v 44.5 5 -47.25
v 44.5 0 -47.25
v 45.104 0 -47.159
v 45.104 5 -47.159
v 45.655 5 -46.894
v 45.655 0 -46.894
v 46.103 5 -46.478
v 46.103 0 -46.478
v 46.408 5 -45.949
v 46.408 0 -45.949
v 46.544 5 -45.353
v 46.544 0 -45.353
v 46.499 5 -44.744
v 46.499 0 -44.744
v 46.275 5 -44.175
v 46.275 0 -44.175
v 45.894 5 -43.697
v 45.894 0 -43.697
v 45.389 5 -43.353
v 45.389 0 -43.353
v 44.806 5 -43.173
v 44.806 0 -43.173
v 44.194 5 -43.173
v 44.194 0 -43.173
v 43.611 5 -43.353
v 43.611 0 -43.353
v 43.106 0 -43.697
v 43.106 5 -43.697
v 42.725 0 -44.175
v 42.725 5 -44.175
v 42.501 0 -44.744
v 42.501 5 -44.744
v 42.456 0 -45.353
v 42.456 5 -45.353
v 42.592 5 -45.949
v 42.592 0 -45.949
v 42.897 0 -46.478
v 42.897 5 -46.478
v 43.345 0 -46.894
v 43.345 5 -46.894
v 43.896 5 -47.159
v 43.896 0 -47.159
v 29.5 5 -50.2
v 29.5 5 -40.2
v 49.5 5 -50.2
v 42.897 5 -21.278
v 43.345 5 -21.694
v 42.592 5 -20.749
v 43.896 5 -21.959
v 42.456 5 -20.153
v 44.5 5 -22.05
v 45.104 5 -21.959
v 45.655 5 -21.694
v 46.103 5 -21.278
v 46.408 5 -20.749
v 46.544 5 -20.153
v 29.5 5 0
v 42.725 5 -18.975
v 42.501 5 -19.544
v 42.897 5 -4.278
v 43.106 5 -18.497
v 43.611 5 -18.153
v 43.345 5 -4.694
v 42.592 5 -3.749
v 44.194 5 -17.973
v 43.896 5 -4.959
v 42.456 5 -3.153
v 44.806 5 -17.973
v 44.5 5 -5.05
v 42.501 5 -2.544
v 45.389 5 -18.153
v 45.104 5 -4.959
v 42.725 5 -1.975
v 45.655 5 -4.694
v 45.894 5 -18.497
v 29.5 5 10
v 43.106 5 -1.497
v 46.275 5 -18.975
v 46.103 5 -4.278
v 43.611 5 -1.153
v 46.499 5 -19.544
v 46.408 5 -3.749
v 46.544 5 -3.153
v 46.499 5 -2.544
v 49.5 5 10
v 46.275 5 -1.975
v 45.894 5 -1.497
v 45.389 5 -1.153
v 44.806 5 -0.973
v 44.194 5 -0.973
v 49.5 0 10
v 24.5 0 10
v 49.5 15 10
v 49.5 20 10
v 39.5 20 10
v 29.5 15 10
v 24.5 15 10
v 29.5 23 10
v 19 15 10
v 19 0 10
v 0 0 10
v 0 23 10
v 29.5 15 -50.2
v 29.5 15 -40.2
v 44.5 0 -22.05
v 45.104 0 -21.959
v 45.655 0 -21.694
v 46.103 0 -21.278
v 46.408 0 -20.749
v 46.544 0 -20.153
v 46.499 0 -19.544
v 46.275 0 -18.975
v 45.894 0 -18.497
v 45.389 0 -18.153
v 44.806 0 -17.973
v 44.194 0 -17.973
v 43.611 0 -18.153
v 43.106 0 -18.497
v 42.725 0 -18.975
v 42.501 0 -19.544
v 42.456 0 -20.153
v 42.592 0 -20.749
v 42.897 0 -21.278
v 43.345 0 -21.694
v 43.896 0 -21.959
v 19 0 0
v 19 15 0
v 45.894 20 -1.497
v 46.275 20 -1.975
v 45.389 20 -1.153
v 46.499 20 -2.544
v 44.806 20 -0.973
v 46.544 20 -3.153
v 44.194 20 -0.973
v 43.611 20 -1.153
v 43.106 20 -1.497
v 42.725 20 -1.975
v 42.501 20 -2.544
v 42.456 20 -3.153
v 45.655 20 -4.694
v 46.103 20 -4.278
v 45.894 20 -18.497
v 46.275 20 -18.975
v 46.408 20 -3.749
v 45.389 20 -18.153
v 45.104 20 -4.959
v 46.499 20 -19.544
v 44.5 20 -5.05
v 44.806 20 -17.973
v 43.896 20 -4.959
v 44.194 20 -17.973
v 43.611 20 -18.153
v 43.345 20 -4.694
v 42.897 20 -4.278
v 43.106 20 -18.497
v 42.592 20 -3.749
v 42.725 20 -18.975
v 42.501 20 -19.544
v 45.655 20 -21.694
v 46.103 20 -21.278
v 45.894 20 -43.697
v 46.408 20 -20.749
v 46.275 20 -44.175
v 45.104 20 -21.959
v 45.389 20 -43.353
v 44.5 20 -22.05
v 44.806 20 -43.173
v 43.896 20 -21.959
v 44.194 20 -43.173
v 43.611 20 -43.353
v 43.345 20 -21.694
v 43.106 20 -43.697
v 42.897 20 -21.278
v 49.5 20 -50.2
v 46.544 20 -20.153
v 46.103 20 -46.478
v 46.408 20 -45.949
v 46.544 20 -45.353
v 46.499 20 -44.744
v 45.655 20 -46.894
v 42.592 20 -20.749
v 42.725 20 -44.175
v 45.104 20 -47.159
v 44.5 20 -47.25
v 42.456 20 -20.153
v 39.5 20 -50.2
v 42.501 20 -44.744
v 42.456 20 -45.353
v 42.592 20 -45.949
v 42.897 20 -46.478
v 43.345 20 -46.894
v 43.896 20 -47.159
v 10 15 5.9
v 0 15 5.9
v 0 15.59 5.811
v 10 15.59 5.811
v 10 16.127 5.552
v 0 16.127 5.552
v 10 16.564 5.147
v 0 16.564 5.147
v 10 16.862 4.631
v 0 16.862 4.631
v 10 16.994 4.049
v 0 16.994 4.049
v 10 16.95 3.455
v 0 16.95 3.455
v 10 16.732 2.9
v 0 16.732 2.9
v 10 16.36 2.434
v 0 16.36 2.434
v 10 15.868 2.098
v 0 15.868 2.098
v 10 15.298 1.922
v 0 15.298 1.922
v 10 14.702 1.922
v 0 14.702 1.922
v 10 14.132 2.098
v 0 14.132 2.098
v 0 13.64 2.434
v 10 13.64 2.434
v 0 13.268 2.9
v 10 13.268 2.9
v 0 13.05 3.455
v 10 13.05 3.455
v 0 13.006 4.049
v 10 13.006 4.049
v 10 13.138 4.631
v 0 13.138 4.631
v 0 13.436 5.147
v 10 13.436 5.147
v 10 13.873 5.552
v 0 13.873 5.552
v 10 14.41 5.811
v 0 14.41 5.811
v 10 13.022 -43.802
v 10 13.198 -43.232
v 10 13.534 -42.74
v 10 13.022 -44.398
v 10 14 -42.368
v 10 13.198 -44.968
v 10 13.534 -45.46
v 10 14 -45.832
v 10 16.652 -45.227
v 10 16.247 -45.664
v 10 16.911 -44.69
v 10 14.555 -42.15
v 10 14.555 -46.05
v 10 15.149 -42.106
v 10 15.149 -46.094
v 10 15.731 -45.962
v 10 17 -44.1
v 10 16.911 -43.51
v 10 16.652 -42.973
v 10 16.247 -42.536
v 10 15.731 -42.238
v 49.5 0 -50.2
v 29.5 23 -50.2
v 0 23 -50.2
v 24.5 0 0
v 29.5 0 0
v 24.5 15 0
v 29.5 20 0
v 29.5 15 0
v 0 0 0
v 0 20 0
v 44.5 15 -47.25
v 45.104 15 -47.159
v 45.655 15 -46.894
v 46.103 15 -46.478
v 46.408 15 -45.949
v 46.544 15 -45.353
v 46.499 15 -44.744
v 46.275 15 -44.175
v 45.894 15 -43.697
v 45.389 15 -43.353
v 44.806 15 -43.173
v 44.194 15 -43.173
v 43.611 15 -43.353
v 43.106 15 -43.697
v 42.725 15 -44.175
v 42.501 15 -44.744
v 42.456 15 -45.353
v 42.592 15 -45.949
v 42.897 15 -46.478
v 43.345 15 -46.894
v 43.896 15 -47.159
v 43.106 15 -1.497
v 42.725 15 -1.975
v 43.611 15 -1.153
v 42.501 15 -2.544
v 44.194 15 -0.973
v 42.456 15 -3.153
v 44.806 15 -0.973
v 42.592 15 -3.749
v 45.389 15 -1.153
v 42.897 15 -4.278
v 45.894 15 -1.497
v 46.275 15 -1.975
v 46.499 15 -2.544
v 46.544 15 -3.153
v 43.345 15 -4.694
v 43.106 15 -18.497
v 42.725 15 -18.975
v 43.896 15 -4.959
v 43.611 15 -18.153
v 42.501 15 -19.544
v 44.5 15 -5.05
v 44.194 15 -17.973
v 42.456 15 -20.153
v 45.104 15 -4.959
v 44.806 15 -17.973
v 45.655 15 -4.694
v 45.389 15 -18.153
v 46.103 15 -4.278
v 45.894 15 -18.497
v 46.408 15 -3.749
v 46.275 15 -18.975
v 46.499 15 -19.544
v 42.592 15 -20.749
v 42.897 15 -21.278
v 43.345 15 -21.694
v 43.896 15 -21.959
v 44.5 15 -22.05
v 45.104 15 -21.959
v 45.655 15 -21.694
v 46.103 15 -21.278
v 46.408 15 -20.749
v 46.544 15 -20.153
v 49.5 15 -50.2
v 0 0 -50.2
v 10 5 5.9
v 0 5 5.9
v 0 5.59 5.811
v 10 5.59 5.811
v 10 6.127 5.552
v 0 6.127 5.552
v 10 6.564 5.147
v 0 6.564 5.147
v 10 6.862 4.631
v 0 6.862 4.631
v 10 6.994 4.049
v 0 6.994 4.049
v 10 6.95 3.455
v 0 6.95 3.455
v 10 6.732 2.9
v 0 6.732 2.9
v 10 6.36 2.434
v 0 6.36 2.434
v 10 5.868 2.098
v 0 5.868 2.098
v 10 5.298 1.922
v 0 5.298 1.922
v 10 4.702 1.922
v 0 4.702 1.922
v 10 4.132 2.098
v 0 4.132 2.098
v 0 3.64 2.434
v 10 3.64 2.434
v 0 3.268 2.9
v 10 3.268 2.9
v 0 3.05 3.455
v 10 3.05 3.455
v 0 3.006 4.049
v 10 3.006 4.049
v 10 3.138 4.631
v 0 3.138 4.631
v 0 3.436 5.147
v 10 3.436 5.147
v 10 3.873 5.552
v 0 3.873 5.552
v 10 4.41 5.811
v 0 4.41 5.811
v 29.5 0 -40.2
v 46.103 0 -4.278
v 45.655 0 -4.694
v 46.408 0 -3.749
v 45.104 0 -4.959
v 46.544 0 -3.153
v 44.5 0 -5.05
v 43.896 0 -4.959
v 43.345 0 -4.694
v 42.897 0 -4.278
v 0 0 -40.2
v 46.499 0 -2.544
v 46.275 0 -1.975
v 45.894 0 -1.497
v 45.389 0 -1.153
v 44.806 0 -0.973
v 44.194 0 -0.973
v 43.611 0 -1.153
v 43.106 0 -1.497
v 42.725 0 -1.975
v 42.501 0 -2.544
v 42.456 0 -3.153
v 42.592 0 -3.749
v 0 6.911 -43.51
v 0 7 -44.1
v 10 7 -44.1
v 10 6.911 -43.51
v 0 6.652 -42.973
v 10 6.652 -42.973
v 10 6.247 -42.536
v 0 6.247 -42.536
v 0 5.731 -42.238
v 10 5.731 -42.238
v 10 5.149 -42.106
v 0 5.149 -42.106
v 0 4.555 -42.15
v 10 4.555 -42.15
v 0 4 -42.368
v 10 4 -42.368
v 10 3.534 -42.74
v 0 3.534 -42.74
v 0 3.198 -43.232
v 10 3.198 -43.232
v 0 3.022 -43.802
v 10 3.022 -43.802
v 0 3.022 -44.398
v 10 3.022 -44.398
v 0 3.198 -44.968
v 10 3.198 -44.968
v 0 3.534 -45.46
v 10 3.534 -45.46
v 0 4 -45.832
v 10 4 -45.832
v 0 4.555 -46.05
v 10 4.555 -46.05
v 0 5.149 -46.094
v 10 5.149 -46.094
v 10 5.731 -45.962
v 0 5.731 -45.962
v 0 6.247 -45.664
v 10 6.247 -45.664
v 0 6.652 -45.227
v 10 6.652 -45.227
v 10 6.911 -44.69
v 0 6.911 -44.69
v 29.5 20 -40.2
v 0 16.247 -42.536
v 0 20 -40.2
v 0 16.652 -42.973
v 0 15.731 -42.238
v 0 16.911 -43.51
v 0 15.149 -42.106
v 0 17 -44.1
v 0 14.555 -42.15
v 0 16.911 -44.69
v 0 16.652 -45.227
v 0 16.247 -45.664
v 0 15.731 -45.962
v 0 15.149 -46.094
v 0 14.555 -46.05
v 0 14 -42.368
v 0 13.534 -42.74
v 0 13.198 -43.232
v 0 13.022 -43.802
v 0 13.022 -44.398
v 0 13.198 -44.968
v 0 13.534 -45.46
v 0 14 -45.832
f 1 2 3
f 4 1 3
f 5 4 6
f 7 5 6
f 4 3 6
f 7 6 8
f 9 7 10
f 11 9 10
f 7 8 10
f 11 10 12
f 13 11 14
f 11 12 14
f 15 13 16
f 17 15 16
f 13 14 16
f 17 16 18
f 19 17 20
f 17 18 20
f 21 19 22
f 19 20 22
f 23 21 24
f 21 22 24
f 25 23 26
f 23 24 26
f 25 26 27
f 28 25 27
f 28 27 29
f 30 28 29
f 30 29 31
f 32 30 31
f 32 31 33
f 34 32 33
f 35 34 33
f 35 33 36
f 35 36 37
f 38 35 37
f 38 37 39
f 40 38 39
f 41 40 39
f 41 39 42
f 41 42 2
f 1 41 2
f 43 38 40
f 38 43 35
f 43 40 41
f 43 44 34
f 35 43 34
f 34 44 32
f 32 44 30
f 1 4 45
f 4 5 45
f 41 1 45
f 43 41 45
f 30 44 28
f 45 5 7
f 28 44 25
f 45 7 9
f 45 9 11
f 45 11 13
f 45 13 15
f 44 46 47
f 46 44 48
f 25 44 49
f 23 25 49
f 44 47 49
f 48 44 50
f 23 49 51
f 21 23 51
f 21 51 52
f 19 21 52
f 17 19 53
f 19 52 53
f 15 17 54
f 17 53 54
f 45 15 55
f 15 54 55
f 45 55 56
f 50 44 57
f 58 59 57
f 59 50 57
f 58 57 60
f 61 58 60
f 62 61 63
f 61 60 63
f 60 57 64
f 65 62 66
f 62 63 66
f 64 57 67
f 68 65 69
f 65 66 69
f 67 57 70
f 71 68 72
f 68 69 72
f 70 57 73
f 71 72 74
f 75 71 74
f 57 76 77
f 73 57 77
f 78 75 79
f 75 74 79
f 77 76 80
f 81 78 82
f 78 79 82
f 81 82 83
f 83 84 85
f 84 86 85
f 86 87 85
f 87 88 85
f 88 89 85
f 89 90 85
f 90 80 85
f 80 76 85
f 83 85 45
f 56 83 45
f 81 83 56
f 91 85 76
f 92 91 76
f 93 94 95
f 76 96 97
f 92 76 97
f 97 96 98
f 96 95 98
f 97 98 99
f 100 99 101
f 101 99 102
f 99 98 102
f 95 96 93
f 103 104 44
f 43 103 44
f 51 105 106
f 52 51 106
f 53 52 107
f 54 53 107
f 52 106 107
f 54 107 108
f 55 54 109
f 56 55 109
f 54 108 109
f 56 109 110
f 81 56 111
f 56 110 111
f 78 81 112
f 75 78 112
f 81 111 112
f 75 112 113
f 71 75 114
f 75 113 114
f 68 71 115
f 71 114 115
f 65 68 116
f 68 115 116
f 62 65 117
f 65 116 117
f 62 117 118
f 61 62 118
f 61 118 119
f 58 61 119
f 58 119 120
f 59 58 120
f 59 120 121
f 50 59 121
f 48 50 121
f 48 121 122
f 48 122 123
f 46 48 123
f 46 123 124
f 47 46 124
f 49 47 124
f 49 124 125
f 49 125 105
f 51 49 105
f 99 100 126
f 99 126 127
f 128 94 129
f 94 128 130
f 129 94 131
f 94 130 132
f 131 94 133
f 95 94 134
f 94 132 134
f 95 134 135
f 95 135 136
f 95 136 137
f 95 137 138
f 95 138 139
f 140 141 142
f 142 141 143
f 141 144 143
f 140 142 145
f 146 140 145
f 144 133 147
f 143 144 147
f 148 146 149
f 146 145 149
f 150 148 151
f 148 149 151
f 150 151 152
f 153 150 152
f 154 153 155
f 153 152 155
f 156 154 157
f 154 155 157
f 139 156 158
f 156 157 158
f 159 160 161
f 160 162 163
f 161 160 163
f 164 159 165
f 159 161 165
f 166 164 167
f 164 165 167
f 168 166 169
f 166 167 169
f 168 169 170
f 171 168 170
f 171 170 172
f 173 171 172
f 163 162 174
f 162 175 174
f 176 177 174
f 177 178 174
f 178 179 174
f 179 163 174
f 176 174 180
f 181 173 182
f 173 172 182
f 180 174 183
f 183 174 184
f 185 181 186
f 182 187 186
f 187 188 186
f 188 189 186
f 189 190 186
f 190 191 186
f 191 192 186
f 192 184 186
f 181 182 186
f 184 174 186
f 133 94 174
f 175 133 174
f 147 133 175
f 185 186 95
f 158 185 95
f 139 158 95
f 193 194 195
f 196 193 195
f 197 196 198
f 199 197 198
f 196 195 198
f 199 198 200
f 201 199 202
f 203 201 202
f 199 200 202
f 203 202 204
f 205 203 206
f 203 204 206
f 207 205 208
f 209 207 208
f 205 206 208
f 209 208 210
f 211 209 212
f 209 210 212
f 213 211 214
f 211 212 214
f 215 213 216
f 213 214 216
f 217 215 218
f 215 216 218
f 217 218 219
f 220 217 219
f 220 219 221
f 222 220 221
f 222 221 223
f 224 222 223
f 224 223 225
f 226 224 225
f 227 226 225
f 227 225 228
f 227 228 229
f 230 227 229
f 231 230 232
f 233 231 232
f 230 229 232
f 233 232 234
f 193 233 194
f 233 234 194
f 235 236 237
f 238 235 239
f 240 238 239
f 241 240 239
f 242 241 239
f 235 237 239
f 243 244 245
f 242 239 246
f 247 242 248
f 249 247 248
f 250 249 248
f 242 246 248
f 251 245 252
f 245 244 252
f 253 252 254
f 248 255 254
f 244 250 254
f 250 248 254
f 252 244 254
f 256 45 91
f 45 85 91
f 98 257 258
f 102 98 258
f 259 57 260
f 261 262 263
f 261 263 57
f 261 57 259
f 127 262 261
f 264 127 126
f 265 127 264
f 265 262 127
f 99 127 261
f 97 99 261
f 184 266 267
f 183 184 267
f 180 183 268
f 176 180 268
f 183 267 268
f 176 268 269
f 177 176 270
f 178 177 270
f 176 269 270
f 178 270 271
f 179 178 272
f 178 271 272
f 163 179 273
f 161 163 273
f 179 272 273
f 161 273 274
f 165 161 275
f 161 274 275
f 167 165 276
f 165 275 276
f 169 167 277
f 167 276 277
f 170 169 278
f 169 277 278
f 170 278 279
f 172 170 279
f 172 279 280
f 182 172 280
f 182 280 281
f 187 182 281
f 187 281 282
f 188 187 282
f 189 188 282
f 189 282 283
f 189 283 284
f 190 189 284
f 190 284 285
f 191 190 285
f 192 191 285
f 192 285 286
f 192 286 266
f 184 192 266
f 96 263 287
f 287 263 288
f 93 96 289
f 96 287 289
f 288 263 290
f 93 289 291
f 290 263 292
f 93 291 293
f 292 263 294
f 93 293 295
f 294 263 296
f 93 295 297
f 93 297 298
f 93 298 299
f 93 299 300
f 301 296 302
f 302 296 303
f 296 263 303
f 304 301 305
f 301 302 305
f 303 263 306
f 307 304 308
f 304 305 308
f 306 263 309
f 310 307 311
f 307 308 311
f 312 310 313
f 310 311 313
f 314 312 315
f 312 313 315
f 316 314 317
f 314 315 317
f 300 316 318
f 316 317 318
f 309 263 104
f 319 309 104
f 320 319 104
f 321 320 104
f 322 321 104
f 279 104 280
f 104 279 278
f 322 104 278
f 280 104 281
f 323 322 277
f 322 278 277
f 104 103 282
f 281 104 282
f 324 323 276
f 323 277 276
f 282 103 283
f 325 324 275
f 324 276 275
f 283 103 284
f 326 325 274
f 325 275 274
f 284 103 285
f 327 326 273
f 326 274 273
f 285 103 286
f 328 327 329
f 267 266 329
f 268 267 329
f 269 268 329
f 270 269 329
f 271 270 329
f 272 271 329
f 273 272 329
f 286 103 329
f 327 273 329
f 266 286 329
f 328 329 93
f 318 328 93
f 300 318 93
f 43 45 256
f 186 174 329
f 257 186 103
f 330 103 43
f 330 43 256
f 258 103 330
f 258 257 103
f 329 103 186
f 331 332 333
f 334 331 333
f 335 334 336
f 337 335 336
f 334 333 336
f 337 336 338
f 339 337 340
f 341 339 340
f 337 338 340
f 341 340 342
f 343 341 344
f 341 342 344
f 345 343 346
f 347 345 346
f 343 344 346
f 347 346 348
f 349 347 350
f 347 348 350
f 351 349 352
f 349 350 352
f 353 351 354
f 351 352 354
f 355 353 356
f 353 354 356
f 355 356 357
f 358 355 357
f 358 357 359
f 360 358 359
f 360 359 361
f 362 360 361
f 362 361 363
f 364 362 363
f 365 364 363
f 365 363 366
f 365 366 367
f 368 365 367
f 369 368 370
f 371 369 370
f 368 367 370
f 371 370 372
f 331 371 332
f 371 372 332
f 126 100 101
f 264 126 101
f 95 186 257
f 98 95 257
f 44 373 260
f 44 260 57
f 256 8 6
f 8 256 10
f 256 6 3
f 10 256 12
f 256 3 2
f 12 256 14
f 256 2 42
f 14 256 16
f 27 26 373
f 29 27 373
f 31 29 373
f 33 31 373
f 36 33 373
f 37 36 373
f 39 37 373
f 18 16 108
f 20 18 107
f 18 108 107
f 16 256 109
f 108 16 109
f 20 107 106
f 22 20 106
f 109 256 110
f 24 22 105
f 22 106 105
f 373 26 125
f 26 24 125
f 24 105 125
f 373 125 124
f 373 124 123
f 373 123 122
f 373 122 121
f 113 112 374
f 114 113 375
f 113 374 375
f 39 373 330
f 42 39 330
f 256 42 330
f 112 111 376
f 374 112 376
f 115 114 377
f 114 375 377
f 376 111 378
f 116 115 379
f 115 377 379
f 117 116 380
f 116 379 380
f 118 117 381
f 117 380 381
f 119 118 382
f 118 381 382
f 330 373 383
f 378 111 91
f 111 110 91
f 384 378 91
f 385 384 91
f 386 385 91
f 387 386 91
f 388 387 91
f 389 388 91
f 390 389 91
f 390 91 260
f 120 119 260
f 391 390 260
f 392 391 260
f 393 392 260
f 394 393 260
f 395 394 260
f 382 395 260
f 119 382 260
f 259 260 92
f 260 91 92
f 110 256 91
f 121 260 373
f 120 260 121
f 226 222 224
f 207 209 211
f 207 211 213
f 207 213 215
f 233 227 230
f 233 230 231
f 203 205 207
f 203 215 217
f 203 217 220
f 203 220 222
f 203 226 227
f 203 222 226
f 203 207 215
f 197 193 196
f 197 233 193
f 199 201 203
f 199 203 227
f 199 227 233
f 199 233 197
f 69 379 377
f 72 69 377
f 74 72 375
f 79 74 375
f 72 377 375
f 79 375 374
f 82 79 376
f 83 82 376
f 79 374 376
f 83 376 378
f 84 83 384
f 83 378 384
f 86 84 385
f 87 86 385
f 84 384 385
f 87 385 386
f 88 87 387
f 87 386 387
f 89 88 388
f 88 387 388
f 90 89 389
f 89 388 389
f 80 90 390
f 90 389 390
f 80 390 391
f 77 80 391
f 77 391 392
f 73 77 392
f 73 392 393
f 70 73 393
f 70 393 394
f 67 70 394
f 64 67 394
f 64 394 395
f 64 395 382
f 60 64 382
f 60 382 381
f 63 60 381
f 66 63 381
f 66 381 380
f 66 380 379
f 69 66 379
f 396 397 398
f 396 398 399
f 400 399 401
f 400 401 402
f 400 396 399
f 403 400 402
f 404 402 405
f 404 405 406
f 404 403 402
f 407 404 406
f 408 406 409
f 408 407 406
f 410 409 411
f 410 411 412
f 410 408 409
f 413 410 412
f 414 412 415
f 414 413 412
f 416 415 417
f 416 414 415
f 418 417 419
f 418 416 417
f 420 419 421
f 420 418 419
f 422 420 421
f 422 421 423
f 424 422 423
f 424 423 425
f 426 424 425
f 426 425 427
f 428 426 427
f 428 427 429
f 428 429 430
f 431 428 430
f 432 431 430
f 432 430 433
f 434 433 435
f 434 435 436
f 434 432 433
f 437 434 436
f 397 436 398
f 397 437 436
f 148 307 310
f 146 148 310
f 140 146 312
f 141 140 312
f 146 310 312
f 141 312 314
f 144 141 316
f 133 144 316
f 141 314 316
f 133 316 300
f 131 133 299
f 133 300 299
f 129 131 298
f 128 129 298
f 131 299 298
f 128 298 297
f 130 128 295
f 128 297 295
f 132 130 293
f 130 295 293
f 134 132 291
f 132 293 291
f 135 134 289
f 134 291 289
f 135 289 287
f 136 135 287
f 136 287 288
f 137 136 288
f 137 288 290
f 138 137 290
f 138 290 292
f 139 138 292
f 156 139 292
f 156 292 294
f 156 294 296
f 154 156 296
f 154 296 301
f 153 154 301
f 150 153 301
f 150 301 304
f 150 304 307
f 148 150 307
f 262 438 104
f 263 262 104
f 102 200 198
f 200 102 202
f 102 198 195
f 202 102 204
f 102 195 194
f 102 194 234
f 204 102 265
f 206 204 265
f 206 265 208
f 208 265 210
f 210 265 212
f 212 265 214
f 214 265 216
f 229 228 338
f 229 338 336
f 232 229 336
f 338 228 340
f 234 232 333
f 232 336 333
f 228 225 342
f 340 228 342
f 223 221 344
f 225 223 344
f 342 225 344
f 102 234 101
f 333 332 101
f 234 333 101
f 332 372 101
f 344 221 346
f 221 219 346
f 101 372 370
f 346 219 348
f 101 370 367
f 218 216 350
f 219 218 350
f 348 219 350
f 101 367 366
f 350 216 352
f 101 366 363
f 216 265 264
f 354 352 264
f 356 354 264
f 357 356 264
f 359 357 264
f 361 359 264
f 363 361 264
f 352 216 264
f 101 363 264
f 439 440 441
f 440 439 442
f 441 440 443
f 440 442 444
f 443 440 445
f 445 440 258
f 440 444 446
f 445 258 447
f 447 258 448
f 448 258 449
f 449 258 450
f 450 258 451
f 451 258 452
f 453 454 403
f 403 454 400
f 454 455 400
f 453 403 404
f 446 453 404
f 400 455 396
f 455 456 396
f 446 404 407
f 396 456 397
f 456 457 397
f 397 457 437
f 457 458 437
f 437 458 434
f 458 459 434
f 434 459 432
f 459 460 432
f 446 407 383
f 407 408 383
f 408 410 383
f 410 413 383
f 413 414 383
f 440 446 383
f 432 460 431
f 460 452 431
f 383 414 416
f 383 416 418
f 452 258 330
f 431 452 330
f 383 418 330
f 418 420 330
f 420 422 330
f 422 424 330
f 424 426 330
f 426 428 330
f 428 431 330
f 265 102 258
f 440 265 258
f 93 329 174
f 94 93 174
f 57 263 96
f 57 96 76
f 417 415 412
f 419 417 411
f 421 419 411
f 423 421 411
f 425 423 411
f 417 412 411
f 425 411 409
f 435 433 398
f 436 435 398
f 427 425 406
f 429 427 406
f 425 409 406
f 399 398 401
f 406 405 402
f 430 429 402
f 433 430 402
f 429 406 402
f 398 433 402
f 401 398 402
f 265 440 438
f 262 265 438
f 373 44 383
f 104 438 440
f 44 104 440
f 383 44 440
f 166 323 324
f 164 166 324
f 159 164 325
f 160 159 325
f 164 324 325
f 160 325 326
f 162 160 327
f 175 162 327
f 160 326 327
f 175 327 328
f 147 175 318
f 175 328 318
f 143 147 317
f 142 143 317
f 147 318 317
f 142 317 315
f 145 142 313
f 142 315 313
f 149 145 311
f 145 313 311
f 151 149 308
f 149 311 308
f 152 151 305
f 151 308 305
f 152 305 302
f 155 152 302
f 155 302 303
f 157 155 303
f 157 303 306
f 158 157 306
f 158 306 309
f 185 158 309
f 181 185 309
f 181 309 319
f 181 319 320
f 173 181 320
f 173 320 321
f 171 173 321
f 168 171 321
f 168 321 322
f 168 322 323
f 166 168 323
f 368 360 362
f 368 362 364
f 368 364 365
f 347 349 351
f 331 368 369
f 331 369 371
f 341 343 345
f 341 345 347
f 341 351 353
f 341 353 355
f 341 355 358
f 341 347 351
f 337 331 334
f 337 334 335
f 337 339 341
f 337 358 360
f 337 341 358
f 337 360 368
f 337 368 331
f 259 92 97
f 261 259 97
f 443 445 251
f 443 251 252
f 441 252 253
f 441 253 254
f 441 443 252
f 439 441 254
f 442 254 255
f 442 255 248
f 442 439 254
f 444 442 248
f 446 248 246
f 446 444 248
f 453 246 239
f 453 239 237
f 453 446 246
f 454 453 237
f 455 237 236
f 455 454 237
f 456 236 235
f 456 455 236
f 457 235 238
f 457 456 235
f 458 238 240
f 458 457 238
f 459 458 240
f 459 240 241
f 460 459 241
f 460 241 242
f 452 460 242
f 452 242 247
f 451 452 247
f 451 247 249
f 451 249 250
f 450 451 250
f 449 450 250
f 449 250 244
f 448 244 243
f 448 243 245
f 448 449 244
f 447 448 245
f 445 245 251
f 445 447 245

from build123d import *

# Parameters (mm, degrees)
BOSS_EXTRUDE1_DEPTH = 10
SKETCH6_W           = 20
SKETCH6_H           = 5
BOSS_EXTRUDE2_DEPTH = 20.1
SKETCH8_W           = 5.5
SKETCH8_H           = 15
CUT_EXTRUDE1_DEPTH  = 20
SKETCH9_R           = 2.05
CUT_EXTRUDE2_DEPTH  = 50
SKETCH2_R           = 2
CUT_EXTRUDE3_DEPTH  = 10
MIRROR3_OUTLINE_R   = 2
MIRROR3_DEPTH       = 10


# Read off the part's stored shape, not the designer's step: Mirror3
with BuildPart() as part:
    # Sketch1 → Boss-Extrude1 (new body)
    with BuildSketch(Plane.XY):
        Polygon((0, 0), (0, 23), (29.5, 23), (39.5, 20), (49.5, 20), (49.5, 15), (29.5, 15), (29.5, 5), (49.5, 5), (49.5, 0), align=None)
    extrude(amount=BOSS_EXTRUDE1_DEPTH)

    # Sketch6 → Boss-Extrude2 (add)
    with BuildSketch(Plane(origin=(0, 0, 0), x_dir=(-1, 0, 0), z_dir=(0, 0, -1))):
        Polygon((-29.5, 15), (-49.5, 15), (-49.5, 20), (-39.5, 20), (-29.5, 23), (0, 23), (0, 20), (-29.5, 20), align=None)
        with Locations((-39.5, 2.5)):
            Rectangle(SKETCH6_W, SKETCH6_H)
    extrude(amount=BOSS_EXTRUDE2_DEPTH)

    # Mirror2: part across face


with BuildPart() as part_1:
    add(part.part)
    add(part.part.mirror(Plane(origin=(28.245085995, 19.497542998, -20.1), x_dir=(1, 0, 0), z_dir=(0, 0, -1))))

    # Sketch8 → Cut-Extrude1 (cut)
    with BuildSketch(Plane.XY.offset(10)):
        with Locations((21.75, 7.5)):
            Rectangle(SKETCH8_W, SKETCH8_H)
    extrude(amount=-CUT_EXTRUDE1_DEPTH, mode=Mode.SUBTRACT)

    # Sketch9 → Cut-Extrude2 (cut)
    with BuildSketch(Plane.XZ):
        with Locations(Location((44.5, -3, 0), (0, 0, 270))):
            Circle(SKETCH9_R)
        with Locations(Location((44.5, -45.2, 0), (0, 0, 270))):
            Circle(SKETCH9_R)
        with Locations(Location((44.5, -20, 0), (0, 0, 270))):
            Circle(SKETCH9_R)
    extrude(amount=-CUT_EXTRUDE2_DEPTH, mode=Mode.SUBTRACT)

    # Sketch2 → Cut-Extrude3 (cut)
    with BuildSketch(Plane.ZY):
        with Locations((3.9, 5)):
            Circle(SKETCH2_R)
        with Locations((3.9, 15)):
            Circle(SKETCH2_R)
    extrude(amount=-CUT_EXTRUDE3_DEPTH, mode=Mode.SUBTRACT)

    # Mirror3 outline → Mirror3 (cut)
    with BuildSketch(Plane.YZ):
        with Locations((15, -44.1)):
            Circle(MIRROR3_OUTLINE_R)
        with Locations((5, -44.1)):
            Circle(MIRROR3_OUTLINE_R)
    extrude(amount=MIRROR3_DEPTH, mode=Mode.SUBTRACT)


solid = part_1.part
